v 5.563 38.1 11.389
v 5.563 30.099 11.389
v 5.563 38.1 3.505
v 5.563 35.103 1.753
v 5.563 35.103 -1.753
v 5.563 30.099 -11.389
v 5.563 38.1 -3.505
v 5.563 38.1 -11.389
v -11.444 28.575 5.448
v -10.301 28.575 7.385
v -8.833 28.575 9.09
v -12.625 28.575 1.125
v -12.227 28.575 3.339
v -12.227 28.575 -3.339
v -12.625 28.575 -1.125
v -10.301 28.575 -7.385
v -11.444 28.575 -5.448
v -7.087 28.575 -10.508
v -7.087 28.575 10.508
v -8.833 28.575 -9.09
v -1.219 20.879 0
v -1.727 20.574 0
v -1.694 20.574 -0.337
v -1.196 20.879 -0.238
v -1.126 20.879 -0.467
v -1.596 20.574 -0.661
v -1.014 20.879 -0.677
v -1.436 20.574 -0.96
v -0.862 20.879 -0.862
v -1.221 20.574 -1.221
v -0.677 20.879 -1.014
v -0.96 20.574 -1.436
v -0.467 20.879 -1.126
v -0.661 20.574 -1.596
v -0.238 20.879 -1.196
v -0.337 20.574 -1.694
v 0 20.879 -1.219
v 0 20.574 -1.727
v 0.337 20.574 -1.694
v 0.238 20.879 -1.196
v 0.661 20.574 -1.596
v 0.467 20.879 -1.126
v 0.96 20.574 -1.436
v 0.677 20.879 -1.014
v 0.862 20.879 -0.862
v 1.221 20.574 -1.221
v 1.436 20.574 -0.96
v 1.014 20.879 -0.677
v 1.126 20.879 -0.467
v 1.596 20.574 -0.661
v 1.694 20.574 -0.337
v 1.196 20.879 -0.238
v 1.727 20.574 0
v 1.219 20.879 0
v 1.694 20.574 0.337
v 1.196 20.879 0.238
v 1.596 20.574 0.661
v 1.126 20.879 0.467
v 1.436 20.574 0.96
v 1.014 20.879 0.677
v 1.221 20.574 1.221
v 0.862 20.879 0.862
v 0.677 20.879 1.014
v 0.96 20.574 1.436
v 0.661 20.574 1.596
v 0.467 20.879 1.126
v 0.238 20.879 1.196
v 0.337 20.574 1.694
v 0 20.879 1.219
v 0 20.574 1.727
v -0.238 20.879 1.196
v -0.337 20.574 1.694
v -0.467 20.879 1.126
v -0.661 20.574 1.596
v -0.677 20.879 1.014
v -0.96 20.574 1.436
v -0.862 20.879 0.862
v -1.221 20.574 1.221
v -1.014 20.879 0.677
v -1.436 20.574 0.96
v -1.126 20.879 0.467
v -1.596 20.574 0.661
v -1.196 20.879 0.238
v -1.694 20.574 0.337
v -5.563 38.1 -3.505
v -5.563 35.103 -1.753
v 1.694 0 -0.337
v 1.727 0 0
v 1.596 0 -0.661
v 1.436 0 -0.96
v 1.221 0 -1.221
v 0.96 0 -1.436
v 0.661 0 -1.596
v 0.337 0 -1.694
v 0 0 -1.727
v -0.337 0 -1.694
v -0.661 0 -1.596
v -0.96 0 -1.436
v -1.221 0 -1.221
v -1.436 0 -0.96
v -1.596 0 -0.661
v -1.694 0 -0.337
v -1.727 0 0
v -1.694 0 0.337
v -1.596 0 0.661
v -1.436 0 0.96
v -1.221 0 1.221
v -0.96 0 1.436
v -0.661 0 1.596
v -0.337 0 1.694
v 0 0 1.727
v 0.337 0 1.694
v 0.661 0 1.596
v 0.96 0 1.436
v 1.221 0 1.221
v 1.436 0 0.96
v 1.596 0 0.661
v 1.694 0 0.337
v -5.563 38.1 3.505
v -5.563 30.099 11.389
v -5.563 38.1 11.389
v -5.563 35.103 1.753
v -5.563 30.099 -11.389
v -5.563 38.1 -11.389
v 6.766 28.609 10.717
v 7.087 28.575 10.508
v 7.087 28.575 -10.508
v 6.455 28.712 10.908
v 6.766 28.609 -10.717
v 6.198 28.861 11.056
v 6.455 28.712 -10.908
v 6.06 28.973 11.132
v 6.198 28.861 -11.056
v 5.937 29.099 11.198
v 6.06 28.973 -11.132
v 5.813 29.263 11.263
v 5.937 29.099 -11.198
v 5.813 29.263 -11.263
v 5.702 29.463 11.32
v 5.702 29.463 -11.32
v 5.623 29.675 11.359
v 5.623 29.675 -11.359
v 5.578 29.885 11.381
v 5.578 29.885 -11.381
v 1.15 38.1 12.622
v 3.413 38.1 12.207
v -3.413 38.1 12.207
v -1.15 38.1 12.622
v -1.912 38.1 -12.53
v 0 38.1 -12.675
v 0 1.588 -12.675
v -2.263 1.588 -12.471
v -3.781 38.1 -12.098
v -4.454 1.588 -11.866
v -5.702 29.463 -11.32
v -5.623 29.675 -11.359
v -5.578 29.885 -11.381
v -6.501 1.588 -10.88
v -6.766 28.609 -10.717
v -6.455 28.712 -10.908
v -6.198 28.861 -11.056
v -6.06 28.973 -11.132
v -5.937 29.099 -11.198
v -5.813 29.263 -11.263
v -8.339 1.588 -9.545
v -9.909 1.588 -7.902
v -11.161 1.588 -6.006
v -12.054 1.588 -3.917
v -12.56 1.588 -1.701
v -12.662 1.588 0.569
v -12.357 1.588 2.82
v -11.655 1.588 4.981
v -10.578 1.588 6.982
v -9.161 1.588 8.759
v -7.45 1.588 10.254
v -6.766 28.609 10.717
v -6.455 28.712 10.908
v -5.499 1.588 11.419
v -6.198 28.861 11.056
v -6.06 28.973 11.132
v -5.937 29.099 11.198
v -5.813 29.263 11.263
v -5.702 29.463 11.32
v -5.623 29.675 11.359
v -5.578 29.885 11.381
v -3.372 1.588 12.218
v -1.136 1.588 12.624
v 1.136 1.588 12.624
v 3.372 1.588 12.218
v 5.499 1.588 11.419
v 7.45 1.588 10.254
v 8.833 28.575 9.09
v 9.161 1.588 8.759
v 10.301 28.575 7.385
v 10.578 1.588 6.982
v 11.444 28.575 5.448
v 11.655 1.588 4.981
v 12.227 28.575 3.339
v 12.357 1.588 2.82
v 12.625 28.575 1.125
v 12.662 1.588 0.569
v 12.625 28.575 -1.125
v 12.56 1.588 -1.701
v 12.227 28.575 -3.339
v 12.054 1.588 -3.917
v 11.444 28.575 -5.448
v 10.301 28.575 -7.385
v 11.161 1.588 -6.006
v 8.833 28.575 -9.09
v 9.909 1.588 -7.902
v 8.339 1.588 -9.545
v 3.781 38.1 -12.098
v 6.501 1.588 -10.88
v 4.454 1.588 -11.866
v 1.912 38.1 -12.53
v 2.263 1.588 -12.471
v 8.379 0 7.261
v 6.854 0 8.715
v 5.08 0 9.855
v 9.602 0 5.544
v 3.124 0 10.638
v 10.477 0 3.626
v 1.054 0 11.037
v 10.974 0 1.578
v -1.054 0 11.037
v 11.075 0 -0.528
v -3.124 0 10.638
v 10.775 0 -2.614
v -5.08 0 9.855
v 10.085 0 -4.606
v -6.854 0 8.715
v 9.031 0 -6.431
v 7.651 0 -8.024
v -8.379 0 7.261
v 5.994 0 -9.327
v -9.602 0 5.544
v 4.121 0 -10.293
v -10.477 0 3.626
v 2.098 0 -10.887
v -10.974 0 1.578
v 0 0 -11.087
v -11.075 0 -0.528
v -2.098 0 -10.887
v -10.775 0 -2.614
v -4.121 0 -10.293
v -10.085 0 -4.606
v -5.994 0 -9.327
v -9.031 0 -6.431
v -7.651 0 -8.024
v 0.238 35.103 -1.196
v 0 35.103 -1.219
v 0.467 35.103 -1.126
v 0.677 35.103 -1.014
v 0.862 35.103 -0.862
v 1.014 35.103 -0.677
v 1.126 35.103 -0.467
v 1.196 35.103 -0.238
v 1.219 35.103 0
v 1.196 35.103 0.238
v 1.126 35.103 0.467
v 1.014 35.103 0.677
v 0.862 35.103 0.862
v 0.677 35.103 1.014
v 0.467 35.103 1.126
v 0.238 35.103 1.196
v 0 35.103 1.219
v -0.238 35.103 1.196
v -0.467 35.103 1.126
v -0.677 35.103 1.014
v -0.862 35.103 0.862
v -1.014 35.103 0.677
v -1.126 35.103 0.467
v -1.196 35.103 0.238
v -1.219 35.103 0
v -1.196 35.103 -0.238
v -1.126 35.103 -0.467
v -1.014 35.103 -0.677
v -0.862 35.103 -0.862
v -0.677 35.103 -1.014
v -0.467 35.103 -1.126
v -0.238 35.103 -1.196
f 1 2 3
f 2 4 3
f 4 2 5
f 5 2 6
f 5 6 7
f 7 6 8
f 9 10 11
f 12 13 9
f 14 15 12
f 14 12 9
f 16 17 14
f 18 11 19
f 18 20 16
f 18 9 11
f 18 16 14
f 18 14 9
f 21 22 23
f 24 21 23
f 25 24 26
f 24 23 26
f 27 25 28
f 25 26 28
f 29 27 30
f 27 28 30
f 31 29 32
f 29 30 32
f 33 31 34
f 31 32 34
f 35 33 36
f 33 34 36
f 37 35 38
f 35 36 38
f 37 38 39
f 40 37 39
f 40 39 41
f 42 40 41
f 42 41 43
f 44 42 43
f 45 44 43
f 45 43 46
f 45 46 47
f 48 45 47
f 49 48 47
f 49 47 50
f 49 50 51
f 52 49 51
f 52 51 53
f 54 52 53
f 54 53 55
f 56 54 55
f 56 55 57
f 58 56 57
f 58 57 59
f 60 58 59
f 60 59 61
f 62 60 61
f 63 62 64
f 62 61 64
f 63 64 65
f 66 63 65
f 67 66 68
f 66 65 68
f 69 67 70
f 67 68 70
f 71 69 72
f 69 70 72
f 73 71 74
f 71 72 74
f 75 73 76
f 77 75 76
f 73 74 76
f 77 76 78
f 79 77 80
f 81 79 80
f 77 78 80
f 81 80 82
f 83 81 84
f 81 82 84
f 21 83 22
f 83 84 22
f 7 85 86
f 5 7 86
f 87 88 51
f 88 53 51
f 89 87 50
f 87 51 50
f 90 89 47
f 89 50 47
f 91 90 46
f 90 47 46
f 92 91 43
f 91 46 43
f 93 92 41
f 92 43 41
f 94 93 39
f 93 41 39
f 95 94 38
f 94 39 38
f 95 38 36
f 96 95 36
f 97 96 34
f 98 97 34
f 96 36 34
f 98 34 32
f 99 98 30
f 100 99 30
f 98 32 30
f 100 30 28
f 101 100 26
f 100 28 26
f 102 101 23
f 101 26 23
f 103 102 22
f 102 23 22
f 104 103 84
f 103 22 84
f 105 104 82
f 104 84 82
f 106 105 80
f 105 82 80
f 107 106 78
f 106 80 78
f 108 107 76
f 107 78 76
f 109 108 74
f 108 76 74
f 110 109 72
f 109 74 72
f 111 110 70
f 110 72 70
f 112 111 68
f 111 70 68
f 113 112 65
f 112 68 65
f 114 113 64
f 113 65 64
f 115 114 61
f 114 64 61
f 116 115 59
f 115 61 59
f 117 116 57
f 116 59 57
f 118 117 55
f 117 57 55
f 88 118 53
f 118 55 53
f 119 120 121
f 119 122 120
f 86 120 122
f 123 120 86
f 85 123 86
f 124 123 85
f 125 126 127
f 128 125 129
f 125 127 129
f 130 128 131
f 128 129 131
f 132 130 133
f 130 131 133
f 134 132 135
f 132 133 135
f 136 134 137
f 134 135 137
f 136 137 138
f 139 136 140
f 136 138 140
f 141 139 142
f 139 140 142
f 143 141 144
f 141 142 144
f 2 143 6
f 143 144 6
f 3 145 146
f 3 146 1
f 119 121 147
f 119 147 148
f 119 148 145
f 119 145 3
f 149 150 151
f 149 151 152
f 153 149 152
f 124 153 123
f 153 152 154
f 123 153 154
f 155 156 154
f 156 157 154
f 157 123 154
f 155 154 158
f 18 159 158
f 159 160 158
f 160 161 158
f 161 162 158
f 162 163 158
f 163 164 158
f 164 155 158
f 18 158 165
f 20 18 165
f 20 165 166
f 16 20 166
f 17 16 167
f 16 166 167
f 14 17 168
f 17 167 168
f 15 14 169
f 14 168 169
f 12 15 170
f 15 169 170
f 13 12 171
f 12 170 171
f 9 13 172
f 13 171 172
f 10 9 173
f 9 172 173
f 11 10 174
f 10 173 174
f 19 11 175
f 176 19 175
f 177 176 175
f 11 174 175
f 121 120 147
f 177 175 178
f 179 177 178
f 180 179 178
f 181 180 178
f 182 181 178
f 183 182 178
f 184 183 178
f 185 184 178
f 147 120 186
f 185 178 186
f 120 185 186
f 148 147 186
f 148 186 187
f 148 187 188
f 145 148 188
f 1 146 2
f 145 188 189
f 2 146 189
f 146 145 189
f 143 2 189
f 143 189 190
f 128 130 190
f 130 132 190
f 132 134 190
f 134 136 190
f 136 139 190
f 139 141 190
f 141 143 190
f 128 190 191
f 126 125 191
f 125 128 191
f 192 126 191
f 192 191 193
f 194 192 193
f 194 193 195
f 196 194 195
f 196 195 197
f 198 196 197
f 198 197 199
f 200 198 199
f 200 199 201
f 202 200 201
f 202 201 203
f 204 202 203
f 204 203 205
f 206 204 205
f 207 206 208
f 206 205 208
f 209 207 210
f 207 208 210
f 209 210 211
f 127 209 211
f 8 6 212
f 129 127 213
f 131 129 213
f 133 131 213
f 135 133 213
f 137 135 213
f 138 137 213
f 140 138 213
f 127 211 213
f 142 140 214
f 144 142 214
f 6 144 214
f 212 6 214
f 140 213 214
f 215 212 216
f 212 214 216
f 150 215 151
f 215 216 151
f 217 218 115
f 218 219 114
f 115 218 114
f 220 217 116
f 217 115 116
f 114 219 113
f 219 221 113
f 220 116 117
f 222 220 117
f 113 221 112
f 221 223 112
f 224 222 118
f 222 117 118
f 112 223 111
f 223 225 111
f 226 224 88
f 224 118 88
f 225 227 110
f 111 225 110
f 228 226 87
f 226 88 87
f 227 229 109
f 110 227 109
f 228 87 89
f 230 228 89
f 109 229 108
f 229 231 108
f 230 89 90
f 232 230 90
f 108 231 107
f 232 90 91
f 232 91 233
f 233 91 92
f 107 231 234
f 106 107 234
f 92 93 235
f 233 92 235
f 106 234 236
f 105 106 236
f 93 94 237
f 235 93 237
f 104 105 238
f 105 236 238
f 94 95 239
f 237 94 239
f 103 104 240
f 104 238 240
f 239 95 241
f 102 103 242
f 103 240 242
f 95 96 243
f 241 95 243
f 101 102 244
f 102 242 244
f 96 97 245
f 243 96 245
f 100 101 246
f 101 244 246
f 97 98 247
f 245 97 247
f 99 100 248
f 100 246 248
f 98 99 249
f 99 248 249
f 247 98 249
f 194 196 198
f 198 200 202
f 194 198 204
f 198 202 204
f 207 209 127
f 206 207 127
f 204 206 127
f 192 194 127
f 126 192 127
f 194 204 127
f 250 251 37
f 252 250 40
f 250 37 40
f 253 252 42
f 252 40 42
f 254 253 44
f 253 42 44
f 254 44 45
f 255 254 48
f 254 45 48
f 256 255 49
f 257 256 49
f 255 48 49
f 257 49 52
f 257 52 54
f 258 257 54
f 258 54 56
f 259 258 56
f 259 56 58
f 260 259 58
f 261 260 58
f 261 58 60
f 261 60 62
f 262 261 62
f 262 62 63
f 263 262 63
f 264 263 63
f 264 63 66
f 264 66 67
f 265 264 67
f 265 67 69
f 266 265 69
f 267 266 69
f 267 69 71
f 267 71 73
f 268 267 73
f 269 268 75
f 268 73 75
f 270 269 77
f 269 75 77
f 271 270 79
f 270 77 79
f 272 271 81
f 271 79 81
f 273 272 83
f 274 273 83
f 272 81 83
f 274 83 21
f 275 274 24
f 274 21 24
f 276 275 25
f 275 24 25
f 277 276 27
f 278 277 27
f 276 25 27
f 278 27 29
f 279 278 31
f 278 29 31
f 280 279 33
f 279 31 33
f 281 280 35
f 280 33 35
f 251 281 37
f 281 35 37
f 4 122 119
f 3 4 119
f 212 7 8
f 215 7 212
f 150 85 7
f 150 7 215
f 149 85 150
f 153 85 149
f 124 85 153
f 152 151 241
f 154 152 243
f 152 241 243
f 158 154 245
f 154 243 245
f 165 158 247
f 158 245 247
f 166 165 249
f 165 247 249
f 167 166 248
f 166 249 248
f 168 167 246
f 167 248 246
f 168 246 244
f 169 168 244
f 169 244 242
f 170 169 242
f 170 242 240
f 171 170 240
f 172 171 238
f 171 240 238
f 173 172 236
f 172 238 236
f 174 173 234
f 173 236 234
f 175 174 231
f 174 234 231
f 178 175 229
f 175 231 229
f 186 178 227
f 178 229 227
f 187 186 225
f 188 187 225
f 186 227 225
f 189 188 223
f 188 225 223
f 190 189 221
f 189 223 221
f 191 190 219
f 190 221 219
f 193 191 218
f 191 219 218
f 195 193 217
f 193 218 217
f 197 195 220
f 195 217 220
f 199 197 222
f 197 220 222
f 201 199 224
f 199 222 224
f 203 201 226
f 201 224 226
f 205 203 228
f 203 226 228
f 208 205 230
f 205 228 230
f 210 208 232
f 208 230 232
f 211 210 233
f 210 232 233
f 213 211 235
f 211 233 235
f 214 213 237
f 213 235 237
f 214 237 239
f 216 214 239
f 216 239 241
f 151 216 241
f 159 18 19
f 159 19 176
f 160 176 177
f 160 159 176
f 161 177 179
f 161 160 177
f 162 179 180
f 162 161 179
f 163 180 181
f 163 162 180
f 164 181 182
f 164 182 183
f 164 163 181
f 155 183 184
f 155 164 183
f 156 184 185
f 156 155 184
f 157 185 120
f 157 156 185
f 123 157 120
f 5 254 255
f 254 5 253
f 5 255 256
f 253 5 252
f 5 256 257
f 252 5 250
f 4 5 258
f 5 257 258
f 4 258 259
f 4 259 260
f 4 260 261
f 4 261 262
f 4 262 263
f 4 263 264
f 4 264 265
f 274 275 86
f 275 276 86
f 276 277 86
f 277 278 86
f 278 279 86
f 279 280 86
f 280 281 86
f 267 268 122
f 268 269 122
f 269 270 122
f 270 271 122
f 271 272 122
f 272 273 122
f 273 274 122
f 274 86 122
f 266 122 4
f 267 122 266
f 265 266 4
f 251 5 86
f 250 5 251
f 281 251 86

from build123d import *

# Parameters (mm, degrees)
CROQUIS1_R                  = 12.6746
SALIENTE_EXTRUIR1_DEPTH     = 38.1
CORTAR_EXTRUIR1_DEPTH       = 43.105830598
CORTAR_EXTRUIR1_DEPTH_BACK  = 43.105830598
CORTAR_EXTRUIR2_DEPTH       = 43.105830598
CORTAR_EXTRUIR2_DEPTH_BACK  = 43.105830598
CHAFL_N1_SIZE               = 1.5875
CROQUIS4_R                  = 1.2192
CORTAR_EXTRUIR3_DEPTH       = 43.105830748
TALADRO_ROSCADO_8_321_D     = 3.4544
TALADRO_ROSCADO_8_321_DEPTH = 20.574
TALADRO_ROSCADO_8_321_TIP   = 1.037806461


with BuildPart() as part:
    # Croquis1 → Saliente-Extruir1 (new body)
    with BuildSketch(Plane(origin=(0, 0, 0), x_dir=(1, 0, 0), z_dir=(0, 1, 0))):
        with Locations(Location((0, 0, 0), (0, 0, 90))):
            Circle(CROQUIS1_R)
    extrude(amount=SALIENTE_EXTRUIR1_DEPTH)

    # Croquis2 → Cortar-Extruir1 (cut, two sides: drawn at the far end of the back side and taken through both)
    with BuildSketch(Plane(origin=(0, 0, 0), x_dir=(0, 0, -1), z_dir=(1, 0, 0)).offset(-CORTAR_EXTRUIR1_DEPTH_BACK)):
        Polygon((-3.5052, 38.1), (3.5052, 38.1), (1.7526, 35.1028), (-1.7526, 35.1028), align=None)
    extrude(amount=CORTAR_EXTRUIR1_DEPTH + CORTAR_EXTRUIR1_DEPTH_BACK, mode=Mode.SUBTRACT)

    # Croquis3 → Cortar-Extruir2 (cut, two sides: drawn at the far end of the back side and taken through both)
    with BuildSketch(Plane.XY.offset(-CORTAR_EXTRUIR2_DEPTH_BACK)):
        with BuildLine():
            Line((-12.6746, 28.575), (-7.0866, 28.575))
            ThreePointArc((-7.0866, 28.575), (-6.008969265, 29.021369265), (-5.5626, 30.099))
            Line((-5.5626, 30.099), (-5.5626, 38.1))
            Line((-5.5626, 38.1), (-12.6746, 38.1))
            Line((-12.6746, 38.1), (-12.6746, 28.575))
        make_face()
        with BuildLine():
            Line((12.6746, 38.1), (12.6746, 28.575))
            Line((12.6746, 28.575), (7.0866, 28.575))
            ThreePointArc((7.0866, 28.575), (6.008969265, 29.021369265), (5.5626, 30.099))
            Line((5.5626, 30.099), (5.5626, 38.1))
            Line((5.5626, 38.1), (12.6746, 38.1))
        make_face()
    extrude(amount=CORTAR_EXTRUIR2_DEPTH + CORTAR_EXTRUIR2_DEPTH_BACK, mode=Mode.SUBTRACT)

    # Chaflán1
    chafl_n1_edges = [part.edges().sort_by_distance(p)[0] for p in [
        (0, 0, 12.6746),
    ]]
    chamfer(chafl_n1_edges, length=CHAFL_N1_SIZE)

    # Croquis4 → Cortar-Extruir3 (cut, through all)
    with BuildSketch(Plane.XZ):
        with Locations(Location((0, 0, 0), (0, 0, 270))):
            Circle(CROQUIS4_R)
    extrude(amount=-CORTAR_EXTRUIR3_DEPTH, mode=Mode.SUBTRACT)

    # Taladro roscado #8-321
    with Locations(Plane(origin=(0, 0, 0), x_dir=(-1, 0, 0), z_dir=(0, -1, 0))):
        with Locations((0, 0)):
            Hole(TALADRO_ROSCADO_8_321_D / 2, depth=TALADRO_ROSCADO_8_321_DEPTH)
            with Locations((0, 0, -(TALADRO_ROSCADO_8_321_DEPTH + TALADRO_ROSCADO_8_321_TIP / 2))):  # 118° drill point
                Cone(0, TALADRO_ROSCADO_8_321_D / 2, TALADRO_ROSCADO_8_321_TIP, mode=Mode.SUBTRACT)


solid = part.part
